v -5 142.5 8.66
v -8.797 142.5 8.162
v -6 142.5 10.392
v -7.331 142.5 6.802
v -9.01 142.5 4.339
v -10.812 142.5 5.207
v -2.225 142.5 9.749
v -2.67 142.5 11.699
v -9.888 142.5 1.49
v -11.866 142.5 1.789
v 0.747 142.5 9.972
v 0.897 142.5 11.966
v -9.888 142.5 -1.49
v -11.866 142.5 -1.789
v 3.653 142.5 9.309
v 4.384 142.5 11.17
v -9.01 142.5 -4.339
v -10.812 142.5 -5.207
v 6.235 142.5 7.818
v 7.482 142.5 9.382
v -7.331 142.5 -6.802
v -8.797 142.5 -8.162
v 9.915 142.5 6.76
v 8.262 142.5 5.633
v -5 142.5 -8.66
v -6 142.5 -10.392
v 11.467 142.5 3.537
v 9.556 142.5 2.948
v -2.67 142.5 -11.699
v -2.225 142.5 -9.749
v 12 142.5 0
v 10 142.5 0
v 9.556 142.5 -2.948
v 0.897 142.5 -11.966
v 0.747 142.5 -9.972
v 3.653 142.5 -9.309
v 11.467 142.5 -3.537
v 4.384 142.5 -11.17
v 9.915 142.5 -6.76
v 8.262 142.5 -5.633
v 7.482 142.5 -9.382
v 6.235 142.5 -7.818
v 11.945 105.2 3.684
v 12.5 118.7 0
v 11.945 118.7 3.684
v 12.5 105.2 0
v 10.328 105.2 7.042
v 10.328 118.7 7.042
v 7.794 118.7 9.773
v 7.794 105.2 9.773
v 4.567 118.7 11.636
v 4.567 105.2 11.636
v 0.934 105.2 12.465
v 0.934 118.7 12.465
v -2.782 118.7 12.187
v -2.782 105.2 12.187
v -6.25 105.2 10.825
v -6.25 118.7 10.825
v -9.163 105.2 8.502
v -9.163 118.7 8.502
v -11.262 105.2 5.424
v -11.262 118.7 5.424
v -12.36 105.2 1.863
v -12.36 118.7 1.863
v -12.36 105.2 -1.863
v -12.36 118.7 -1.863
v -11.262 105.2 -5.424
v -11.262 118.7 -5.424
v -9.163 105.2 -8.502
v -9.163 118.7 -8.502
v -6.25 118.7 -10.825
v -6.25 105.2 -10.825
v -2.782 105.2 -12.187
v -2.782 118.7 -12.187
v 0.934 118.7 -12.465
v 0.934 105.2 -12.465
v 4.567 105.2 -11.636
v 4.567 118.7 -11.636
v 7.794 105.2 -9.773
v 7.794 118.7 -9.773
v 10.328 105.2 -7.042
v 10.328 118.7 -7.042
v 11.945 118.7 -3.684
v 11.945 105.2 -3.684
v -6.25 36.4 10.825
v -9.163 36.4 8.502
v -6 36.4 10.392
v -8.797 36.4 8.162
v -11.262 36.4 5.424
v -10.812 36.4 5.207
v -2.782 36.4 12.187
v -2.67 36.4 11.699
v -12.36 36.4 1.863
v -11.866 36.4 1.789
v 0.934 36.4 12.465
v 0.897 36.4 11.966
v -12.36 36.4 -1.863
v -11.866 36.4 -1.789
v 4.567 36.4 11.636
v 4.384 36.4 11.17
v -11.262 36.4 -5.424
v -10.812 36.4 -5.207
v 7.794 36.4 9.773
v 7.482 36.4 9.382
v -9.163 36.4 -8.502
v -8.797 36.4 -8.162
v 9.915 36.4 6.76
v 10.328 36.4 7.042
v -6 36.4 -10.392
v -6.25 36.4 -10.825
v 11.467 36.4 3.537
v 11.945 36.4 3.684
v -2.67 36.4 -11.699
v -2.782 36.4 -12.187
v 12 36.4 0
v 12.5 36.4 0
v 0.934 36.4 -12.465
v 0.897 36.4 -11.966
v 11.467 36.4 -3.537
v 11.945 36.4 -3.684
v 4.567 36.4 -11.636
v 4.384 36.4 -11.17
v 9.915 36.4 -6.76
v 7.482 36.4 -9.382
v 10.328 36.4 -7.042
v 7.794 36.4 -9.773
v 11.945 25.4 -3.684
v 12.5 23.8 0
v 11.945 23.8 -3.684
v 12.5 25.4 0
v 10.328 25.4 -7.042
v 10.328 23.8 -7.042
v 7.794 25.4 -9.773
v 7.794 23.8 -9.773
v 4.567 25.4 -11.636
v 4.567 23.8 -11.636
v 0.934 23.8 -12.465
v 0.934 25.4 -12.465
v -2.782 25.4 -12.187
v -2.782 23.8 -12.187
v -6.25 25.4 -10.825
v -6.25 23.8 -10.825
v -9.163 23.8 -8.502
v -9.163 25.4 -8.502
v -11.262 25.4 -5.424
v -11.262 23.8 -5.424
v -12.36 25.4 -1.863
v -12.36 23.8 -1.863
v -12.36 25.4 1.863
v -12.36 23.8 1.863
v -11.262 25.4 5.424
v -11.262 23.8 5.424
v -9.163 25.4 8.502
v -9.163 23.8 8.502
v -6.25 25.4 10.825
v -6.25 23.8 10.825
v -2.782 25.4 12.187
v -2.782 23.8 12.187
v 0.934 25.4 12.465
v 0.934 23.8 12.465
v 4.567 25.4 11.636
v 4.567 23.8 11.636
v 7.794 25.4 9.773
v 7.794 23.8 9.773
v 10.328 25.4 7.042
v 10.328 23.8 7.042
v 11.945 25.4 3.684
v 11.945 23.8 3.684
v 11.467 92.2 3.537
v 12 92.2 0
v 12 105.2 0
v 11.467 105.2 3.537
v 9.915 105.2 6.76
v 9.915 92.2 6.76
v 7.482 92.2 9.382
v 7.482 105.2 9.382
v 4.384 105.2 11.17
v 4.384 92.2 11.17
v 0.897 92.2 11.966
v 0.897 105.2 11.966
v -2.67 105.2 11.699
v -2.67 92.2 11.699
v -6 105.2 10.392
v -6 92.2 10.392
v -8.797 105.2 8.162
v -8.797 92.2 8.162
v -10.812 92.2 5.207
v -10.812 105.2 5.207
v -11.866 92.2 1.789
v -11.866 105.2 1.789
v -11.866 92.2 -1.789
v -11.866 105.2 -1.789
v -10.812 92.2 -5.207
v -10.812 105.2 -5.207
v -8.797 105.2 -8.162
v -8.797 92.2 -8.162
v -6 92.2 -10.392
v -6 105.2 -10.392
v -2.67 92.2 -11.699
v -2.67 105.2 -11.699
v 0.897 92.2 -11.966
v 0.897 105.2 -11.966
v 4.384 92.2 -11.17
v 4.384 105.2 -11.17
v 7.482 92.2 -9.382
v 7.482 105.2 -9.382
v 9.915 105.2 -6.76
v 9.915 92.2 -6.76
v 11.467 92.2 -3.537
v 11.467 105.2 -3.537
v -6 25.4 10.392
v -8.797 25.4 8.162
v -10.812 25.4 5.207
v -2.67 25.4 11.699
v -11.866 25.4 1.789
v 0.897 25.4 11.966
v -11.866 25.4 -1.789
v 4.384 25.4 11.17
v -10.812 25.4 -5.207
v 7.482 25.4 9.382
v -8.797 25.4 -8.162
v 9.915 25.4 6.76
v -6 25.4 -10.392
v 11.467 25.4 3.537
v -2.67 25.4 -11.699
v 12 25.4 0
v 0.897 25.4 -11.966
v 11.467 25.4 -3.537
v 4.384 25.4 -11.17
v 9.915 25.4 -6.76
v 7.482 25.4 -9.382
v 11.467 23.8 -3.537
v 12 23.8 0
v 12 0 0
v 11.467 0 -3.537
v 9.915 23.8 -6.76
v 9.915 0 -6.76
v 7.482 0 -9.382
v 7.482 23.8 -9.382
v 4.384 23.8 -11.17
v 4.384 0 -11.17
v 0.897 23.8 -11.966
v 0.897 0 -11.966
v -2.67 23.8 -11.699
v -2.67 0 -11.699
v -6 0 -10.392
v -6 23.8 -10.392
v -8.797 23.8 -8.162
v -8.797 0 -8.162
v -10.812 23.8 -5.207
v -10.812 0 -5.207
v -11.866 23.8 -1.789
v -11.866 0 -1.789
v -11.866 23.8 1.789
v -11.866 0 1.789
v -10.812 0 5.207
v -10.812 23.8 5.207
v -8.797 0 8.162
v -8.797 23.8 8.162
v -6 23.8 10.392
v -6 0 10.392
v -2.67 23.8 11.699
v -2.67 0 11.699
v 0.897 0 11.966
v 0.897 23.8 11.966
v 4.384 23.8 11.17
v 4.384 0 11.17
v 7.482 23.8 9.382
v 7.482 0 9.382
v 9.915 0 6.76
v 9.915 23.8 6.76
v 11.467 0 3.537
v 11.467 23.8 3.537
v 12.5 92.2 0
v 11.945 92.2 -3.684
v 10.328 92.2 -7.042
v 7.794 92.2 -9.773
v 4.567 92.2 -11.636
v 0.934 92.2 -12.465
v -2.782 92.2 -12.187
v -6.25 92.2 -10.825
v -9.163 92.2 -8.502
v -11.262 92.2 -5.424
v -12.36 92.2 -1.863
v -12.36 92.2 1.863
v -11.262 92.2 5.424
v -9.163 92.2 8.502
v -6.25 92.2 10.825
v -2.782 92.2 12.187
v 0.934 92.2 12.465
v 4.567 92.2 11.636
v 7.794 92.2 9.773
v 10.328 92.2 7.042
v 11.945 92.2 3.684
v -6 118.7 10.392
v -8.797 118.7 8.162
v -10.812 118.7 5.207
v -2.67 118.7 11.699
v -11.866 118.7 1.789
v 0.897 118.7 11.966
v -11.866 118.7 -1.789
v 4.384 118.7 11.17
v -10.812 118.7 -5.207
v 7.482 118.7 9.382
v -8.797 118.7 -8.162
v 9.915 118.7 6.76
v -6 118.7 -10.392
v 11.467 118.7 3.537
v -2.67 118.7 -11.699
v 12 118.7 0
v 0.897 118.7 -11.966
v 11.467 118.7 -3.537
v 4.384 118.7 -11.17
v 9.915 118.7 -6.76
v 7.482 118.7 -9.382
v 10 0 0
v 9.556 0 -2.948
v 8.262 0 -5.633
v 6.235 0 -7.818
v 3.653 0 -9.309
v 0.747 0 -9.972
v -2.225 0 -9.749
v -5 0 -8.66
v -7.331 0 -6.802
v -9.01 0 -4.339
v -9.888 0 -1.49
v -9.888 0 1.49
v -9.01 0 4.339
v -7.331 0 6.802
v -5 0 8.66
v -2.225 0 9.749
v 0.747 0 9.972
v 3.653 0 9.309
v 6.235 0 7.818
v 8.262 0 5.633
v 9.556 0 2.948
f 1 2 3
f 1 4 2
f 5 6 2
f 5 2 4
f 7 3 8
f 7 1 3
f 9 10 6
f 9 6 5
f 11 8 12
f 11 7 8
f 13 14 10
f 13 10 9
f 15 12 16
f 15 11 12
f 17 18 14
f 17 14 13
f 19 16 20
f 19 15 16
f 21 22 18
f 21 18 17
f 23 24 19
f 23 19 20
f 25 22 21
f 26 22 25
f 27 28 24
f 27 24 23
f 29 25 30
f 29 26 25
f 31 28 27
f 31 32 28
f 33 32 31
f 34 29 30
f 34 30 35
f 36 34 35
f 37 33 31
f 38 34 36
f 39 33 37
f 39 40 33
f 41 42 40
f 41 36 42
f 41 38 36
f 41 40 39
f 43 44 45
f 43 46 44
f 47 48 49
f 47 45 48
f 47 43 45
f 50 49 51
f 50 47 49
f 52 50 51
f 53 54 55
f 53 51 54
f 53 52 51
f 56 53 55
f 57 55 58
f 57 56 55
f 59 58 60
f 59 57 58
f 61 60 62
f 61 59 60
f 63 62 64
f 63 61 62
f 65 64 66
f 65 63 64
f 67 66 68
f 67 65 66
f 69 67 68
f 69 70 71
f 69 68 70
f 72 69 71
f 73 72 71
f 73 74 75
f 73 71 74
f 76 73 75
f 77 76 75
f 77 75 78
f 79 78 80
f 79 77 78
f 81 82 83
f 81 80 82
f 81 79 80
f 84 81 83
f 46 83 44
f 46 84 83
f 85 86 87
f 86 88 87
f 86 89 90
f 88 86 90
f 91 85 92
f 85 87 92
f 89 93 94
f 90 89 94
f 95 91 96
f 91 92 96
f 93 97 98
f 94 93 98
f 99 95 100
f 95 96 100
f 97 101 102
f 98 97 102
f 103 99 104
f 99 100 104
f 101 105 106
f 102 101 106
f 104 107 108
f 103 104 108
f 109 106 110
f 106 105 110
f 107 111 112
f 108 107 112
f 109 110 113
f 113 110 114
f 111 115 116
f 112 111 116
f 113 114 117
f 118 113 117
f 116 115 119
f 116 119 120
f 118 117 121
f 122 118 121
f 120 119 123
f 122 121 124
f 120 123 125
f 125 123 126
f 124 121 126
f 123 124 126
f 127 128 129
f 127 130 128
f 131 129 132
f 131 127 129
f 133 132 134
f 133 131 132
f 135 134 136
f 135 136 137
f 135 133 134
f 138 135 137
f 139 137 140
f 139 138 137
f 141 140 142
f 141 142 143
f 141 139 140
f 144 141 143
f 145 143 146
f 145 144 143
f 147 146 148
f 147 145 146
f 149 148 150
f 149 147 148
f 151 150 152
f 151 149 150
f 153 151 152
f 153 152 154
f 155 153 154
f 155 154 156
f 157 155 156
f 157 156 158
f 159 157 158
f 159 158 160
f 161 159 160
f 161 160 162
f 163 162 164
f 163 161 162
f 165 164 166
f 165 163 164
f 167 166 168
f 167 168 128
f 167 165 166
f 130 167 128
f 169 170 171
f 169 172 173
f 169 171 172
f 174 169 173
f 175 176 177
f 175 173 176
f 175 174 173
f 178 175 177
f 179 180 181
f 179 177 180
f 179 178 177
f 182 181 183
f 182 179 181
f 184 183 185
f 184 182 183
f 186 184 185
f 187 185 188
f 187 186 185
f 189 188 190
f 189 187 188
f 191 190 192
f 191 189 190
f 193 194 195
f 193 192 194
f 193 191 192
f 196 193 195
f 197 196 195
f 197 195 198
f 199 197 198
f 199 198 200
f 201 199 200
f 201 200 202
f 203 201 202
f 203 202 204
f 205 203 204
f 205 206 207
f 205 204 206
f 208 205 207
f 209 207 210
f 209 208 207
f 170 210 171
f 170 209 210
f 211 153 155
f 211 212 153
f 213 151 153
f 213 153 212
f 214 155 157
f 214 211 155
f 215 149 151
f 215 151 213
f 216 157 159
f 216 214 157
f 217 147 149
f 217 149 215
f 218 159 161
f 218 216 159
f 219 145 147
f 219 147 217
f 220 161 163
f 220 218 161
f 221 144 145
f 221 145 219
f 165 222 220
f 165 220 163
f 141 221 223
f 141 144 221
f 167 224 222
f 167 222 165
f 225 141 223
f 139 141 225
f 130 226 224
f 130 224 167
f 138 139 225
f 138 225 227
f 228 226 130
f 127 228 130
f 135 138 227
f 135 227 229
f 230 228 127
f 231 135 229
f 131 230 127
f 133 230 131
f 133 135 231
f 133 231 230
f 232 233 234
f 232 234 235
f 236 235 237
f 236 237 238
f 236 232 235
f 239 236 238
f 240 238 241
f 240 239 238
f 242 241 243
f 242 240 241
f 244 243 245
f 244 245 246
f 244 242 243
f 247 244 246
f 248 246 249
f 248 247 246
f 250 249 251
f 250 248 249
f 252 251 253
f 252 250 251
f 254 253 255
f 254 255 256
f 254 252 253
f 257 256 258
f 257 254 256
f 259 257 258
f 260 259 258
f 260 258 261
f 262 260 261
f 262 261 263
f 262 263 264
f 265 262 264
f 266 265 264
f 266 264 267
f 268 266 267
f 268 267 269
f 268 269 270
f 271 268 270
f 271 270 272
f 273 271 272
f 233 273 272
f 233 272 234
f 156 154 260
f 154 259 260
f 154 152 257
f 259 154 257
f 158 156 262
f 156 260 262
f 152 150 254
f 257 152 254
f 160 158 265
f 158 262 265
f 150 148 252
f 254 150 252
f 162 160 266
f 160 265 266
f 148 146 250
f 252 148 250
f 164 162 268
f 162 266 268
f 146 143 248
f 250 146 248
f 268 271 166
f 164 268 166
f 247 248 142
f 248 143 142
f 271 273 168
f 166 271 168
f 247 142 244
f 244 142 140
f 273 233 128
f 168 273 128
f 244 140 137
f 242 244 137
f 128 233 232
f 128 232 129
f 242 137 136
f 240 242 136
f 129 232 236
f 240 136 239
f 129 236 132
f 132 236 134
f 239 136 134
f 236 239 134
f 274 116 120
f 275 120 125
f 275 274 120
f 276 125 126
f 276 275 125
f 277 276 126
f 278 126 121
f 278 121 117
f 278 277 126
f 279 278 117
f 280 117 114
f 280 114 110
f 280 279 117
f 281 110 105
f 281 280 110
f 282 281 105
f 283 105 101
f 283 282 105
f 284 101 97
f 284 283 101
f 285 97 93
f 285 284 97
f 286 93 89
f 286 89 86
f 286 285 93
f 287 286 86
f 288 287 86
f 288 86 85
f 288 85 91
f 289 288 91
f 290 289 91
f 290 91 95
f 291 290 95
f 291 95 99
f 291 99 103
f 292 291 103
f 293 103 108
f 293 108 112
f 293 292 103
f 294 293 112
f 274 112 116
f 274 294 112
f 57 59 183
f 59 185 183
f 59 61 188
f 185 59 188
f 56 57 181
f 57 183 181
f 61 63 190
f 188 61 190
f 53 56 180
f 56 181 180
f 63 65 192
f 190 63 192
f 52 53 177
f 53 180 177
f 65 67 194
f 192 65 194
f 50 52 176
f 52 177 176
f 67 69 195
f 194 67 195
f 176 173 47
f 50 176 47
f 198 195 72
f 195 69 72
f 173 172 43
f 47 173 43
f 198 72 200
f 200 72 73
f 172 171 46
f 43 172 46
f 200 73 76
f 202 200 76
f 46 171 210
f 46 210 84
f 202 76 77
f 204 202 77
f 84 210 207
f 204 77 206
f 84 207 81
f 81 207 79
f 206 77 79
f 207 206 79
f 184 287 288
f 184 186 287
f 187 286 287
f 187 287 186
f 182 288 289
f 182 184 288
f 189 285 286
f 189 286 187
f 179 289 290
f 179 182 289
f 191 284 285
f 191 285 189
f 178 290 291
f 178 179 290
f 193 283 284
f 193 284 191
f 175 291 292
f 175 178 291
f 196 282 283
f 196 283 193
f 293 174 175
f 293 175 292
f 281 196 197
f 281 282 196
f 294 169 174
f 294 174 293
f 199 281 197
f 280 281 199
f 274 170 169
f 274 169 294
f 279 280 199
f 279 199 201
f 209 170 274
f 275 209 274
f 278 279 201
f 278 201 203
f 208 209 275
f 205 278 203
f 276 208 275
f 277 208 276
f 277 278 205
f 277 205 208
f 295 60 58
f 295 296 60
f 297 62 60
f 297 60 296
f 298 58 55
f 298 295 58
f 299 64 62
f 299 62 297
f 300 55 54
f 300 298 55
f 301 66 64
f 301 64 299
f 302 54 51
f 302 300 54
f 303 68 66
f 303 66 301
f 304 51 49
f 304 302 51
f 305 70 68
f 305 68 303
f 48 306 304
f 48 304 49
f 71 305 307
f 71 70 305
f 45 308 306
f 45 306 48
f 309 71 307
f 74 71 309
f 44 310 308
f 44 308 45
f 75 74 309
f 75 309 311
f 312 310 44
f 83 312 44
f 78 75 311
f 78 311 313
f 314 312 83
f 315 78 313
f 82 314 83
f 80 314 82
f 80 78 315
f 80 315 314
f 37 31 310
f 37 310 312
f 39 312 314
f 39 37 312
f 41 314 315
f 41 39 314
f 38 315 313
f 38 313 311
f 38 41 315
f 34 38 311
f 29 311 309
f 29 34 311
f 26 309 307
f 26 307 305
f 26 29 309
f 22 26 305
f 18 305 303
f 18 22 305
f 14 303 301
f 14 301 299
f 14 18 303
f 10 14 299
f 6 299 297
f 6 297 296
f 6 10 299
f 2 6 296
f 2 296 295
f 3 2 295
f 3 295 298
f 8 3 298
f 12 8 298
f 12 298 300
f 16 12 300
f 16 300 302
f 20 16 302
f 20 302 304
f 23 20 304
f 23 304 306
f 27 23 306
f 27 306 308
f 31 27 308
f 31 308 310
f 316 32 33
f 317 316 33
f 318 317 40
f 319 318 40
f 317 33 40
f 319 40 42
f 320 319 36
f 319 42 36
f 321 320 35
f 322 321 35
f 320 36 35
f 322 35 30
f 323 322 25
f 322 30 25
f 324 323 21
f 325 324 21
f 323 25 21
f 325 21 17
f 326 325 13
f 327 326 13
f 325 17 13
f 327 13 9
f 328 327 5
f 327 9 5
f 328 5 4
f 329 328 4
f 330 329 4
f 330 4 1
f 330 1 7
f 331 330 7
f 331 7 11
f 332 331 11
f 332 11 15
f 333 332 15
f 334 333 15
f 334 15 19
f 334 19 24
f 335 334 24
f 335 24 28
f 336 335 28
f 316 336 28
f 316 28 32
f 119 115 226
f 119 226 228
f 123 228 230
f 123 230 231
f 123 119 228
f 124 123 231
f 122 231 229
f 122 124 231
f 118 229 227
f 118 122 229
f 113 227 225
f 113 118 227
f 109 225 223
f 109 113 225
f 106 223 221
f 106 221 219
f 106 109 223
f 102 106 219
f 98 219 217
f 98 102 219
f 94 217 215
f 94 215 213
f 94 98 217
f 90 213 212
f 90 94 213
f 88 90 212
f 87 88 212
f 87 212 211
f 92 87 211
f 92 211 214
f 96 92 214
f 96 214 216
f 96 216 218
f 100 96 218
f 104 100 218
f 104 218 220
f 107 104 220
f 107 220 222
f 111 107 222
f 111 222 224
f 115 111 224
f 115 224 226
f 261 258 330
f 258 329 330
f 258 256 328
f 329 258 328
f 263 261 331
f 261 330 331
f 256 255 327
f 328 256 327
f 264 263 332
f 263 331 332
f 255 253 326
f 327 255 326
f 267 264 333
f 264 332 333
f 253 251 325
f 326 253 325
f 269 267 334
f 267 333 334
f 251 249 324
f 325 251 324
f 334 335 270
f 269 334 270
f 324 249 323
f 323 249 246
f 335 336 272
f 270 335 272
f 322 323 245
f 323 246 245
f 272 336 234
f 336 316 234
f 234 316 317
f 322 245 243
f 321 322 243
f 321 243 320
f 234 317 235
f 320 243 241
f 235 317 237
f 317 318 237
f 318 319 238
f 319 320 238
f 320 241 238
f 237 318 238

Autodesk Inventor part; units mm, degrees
ref_plane "YZ Plane" through (0, 0, 0) normal (1, 0, 0) x (0, 1, 0)
ref_plane "XZ Plane" through (0, 0, 0) normal (0, 1, 0) x (-1, 0, 0)
ref_plane "XY Plane" through (0, 0, 0) normal (0, 0, 1) x (1, 0, 0)
sketch "Sketch1" plane through (0, 0, 0) normal (0, 0, 1) x (1, 0, 0)
  line L0 (0, 0) -> (10, 0)
  line L1 (10, 0) -> (12, 0)
  line L2 (10, 0) -> (10, 142.5)
  line L3 (0, 0) -> (0, 30)
  line L4 (12, 0) -> (12, 23.8)
  line L5 (12, 23.8) -> (12.5, 23.8)
  line L6 (12.5, 23.8) -> (12.5, 25.4)
  line L7 (12.5, 25.4) -> (12, 25.4)
  line L8 (12, 25.4) -> (12, 36.4)
  line L9 (12, 36.4) -> (12.5, 36.4)
  line L10 (12.5, 118.7) -> (12, 118.7)
  line L11 (12, 118.7) -> (12, 142.5)
  line L12 (12, 142.5) -> (10, 142.5)
  line L13 (12.5, 118.7) -> (12.5, 105.2)
  line L14 (12.5, 105.2) -> (12, 105.2)
  line L15 (12, 105.2) -> (12, 92.2)
  line L16 (12, 92.2) -> (12.5, 92.2)
  line L17 (12.5, 36.4) -> (12.5, 92.2)
  line L18 (12.5, 105.2) -> (12.5, 118.7)
  dimension "d0" = 10
  dimension "d1" = 2
  dimension "d2" = 142.5
  dimension "d4" = 30
  dimension "d6" = 23.8
  dimension "d7" = 0.5
  dimension "d8" = 1.6
  dimension "d9" = 11
  dimension "d10" = 90
  dimension "d11" = 0.5
  dimension "d12" = 82.3
  dimension "d13" = 13.5
  dimension "d14" = 0.5
  dimension "d15" = 13
revolve "Revolution1" add sketch "Sketch1" angle 360 about axis through (0, 0, 0) along (0, 1, 0)
properties part number "Axe manivelles"
